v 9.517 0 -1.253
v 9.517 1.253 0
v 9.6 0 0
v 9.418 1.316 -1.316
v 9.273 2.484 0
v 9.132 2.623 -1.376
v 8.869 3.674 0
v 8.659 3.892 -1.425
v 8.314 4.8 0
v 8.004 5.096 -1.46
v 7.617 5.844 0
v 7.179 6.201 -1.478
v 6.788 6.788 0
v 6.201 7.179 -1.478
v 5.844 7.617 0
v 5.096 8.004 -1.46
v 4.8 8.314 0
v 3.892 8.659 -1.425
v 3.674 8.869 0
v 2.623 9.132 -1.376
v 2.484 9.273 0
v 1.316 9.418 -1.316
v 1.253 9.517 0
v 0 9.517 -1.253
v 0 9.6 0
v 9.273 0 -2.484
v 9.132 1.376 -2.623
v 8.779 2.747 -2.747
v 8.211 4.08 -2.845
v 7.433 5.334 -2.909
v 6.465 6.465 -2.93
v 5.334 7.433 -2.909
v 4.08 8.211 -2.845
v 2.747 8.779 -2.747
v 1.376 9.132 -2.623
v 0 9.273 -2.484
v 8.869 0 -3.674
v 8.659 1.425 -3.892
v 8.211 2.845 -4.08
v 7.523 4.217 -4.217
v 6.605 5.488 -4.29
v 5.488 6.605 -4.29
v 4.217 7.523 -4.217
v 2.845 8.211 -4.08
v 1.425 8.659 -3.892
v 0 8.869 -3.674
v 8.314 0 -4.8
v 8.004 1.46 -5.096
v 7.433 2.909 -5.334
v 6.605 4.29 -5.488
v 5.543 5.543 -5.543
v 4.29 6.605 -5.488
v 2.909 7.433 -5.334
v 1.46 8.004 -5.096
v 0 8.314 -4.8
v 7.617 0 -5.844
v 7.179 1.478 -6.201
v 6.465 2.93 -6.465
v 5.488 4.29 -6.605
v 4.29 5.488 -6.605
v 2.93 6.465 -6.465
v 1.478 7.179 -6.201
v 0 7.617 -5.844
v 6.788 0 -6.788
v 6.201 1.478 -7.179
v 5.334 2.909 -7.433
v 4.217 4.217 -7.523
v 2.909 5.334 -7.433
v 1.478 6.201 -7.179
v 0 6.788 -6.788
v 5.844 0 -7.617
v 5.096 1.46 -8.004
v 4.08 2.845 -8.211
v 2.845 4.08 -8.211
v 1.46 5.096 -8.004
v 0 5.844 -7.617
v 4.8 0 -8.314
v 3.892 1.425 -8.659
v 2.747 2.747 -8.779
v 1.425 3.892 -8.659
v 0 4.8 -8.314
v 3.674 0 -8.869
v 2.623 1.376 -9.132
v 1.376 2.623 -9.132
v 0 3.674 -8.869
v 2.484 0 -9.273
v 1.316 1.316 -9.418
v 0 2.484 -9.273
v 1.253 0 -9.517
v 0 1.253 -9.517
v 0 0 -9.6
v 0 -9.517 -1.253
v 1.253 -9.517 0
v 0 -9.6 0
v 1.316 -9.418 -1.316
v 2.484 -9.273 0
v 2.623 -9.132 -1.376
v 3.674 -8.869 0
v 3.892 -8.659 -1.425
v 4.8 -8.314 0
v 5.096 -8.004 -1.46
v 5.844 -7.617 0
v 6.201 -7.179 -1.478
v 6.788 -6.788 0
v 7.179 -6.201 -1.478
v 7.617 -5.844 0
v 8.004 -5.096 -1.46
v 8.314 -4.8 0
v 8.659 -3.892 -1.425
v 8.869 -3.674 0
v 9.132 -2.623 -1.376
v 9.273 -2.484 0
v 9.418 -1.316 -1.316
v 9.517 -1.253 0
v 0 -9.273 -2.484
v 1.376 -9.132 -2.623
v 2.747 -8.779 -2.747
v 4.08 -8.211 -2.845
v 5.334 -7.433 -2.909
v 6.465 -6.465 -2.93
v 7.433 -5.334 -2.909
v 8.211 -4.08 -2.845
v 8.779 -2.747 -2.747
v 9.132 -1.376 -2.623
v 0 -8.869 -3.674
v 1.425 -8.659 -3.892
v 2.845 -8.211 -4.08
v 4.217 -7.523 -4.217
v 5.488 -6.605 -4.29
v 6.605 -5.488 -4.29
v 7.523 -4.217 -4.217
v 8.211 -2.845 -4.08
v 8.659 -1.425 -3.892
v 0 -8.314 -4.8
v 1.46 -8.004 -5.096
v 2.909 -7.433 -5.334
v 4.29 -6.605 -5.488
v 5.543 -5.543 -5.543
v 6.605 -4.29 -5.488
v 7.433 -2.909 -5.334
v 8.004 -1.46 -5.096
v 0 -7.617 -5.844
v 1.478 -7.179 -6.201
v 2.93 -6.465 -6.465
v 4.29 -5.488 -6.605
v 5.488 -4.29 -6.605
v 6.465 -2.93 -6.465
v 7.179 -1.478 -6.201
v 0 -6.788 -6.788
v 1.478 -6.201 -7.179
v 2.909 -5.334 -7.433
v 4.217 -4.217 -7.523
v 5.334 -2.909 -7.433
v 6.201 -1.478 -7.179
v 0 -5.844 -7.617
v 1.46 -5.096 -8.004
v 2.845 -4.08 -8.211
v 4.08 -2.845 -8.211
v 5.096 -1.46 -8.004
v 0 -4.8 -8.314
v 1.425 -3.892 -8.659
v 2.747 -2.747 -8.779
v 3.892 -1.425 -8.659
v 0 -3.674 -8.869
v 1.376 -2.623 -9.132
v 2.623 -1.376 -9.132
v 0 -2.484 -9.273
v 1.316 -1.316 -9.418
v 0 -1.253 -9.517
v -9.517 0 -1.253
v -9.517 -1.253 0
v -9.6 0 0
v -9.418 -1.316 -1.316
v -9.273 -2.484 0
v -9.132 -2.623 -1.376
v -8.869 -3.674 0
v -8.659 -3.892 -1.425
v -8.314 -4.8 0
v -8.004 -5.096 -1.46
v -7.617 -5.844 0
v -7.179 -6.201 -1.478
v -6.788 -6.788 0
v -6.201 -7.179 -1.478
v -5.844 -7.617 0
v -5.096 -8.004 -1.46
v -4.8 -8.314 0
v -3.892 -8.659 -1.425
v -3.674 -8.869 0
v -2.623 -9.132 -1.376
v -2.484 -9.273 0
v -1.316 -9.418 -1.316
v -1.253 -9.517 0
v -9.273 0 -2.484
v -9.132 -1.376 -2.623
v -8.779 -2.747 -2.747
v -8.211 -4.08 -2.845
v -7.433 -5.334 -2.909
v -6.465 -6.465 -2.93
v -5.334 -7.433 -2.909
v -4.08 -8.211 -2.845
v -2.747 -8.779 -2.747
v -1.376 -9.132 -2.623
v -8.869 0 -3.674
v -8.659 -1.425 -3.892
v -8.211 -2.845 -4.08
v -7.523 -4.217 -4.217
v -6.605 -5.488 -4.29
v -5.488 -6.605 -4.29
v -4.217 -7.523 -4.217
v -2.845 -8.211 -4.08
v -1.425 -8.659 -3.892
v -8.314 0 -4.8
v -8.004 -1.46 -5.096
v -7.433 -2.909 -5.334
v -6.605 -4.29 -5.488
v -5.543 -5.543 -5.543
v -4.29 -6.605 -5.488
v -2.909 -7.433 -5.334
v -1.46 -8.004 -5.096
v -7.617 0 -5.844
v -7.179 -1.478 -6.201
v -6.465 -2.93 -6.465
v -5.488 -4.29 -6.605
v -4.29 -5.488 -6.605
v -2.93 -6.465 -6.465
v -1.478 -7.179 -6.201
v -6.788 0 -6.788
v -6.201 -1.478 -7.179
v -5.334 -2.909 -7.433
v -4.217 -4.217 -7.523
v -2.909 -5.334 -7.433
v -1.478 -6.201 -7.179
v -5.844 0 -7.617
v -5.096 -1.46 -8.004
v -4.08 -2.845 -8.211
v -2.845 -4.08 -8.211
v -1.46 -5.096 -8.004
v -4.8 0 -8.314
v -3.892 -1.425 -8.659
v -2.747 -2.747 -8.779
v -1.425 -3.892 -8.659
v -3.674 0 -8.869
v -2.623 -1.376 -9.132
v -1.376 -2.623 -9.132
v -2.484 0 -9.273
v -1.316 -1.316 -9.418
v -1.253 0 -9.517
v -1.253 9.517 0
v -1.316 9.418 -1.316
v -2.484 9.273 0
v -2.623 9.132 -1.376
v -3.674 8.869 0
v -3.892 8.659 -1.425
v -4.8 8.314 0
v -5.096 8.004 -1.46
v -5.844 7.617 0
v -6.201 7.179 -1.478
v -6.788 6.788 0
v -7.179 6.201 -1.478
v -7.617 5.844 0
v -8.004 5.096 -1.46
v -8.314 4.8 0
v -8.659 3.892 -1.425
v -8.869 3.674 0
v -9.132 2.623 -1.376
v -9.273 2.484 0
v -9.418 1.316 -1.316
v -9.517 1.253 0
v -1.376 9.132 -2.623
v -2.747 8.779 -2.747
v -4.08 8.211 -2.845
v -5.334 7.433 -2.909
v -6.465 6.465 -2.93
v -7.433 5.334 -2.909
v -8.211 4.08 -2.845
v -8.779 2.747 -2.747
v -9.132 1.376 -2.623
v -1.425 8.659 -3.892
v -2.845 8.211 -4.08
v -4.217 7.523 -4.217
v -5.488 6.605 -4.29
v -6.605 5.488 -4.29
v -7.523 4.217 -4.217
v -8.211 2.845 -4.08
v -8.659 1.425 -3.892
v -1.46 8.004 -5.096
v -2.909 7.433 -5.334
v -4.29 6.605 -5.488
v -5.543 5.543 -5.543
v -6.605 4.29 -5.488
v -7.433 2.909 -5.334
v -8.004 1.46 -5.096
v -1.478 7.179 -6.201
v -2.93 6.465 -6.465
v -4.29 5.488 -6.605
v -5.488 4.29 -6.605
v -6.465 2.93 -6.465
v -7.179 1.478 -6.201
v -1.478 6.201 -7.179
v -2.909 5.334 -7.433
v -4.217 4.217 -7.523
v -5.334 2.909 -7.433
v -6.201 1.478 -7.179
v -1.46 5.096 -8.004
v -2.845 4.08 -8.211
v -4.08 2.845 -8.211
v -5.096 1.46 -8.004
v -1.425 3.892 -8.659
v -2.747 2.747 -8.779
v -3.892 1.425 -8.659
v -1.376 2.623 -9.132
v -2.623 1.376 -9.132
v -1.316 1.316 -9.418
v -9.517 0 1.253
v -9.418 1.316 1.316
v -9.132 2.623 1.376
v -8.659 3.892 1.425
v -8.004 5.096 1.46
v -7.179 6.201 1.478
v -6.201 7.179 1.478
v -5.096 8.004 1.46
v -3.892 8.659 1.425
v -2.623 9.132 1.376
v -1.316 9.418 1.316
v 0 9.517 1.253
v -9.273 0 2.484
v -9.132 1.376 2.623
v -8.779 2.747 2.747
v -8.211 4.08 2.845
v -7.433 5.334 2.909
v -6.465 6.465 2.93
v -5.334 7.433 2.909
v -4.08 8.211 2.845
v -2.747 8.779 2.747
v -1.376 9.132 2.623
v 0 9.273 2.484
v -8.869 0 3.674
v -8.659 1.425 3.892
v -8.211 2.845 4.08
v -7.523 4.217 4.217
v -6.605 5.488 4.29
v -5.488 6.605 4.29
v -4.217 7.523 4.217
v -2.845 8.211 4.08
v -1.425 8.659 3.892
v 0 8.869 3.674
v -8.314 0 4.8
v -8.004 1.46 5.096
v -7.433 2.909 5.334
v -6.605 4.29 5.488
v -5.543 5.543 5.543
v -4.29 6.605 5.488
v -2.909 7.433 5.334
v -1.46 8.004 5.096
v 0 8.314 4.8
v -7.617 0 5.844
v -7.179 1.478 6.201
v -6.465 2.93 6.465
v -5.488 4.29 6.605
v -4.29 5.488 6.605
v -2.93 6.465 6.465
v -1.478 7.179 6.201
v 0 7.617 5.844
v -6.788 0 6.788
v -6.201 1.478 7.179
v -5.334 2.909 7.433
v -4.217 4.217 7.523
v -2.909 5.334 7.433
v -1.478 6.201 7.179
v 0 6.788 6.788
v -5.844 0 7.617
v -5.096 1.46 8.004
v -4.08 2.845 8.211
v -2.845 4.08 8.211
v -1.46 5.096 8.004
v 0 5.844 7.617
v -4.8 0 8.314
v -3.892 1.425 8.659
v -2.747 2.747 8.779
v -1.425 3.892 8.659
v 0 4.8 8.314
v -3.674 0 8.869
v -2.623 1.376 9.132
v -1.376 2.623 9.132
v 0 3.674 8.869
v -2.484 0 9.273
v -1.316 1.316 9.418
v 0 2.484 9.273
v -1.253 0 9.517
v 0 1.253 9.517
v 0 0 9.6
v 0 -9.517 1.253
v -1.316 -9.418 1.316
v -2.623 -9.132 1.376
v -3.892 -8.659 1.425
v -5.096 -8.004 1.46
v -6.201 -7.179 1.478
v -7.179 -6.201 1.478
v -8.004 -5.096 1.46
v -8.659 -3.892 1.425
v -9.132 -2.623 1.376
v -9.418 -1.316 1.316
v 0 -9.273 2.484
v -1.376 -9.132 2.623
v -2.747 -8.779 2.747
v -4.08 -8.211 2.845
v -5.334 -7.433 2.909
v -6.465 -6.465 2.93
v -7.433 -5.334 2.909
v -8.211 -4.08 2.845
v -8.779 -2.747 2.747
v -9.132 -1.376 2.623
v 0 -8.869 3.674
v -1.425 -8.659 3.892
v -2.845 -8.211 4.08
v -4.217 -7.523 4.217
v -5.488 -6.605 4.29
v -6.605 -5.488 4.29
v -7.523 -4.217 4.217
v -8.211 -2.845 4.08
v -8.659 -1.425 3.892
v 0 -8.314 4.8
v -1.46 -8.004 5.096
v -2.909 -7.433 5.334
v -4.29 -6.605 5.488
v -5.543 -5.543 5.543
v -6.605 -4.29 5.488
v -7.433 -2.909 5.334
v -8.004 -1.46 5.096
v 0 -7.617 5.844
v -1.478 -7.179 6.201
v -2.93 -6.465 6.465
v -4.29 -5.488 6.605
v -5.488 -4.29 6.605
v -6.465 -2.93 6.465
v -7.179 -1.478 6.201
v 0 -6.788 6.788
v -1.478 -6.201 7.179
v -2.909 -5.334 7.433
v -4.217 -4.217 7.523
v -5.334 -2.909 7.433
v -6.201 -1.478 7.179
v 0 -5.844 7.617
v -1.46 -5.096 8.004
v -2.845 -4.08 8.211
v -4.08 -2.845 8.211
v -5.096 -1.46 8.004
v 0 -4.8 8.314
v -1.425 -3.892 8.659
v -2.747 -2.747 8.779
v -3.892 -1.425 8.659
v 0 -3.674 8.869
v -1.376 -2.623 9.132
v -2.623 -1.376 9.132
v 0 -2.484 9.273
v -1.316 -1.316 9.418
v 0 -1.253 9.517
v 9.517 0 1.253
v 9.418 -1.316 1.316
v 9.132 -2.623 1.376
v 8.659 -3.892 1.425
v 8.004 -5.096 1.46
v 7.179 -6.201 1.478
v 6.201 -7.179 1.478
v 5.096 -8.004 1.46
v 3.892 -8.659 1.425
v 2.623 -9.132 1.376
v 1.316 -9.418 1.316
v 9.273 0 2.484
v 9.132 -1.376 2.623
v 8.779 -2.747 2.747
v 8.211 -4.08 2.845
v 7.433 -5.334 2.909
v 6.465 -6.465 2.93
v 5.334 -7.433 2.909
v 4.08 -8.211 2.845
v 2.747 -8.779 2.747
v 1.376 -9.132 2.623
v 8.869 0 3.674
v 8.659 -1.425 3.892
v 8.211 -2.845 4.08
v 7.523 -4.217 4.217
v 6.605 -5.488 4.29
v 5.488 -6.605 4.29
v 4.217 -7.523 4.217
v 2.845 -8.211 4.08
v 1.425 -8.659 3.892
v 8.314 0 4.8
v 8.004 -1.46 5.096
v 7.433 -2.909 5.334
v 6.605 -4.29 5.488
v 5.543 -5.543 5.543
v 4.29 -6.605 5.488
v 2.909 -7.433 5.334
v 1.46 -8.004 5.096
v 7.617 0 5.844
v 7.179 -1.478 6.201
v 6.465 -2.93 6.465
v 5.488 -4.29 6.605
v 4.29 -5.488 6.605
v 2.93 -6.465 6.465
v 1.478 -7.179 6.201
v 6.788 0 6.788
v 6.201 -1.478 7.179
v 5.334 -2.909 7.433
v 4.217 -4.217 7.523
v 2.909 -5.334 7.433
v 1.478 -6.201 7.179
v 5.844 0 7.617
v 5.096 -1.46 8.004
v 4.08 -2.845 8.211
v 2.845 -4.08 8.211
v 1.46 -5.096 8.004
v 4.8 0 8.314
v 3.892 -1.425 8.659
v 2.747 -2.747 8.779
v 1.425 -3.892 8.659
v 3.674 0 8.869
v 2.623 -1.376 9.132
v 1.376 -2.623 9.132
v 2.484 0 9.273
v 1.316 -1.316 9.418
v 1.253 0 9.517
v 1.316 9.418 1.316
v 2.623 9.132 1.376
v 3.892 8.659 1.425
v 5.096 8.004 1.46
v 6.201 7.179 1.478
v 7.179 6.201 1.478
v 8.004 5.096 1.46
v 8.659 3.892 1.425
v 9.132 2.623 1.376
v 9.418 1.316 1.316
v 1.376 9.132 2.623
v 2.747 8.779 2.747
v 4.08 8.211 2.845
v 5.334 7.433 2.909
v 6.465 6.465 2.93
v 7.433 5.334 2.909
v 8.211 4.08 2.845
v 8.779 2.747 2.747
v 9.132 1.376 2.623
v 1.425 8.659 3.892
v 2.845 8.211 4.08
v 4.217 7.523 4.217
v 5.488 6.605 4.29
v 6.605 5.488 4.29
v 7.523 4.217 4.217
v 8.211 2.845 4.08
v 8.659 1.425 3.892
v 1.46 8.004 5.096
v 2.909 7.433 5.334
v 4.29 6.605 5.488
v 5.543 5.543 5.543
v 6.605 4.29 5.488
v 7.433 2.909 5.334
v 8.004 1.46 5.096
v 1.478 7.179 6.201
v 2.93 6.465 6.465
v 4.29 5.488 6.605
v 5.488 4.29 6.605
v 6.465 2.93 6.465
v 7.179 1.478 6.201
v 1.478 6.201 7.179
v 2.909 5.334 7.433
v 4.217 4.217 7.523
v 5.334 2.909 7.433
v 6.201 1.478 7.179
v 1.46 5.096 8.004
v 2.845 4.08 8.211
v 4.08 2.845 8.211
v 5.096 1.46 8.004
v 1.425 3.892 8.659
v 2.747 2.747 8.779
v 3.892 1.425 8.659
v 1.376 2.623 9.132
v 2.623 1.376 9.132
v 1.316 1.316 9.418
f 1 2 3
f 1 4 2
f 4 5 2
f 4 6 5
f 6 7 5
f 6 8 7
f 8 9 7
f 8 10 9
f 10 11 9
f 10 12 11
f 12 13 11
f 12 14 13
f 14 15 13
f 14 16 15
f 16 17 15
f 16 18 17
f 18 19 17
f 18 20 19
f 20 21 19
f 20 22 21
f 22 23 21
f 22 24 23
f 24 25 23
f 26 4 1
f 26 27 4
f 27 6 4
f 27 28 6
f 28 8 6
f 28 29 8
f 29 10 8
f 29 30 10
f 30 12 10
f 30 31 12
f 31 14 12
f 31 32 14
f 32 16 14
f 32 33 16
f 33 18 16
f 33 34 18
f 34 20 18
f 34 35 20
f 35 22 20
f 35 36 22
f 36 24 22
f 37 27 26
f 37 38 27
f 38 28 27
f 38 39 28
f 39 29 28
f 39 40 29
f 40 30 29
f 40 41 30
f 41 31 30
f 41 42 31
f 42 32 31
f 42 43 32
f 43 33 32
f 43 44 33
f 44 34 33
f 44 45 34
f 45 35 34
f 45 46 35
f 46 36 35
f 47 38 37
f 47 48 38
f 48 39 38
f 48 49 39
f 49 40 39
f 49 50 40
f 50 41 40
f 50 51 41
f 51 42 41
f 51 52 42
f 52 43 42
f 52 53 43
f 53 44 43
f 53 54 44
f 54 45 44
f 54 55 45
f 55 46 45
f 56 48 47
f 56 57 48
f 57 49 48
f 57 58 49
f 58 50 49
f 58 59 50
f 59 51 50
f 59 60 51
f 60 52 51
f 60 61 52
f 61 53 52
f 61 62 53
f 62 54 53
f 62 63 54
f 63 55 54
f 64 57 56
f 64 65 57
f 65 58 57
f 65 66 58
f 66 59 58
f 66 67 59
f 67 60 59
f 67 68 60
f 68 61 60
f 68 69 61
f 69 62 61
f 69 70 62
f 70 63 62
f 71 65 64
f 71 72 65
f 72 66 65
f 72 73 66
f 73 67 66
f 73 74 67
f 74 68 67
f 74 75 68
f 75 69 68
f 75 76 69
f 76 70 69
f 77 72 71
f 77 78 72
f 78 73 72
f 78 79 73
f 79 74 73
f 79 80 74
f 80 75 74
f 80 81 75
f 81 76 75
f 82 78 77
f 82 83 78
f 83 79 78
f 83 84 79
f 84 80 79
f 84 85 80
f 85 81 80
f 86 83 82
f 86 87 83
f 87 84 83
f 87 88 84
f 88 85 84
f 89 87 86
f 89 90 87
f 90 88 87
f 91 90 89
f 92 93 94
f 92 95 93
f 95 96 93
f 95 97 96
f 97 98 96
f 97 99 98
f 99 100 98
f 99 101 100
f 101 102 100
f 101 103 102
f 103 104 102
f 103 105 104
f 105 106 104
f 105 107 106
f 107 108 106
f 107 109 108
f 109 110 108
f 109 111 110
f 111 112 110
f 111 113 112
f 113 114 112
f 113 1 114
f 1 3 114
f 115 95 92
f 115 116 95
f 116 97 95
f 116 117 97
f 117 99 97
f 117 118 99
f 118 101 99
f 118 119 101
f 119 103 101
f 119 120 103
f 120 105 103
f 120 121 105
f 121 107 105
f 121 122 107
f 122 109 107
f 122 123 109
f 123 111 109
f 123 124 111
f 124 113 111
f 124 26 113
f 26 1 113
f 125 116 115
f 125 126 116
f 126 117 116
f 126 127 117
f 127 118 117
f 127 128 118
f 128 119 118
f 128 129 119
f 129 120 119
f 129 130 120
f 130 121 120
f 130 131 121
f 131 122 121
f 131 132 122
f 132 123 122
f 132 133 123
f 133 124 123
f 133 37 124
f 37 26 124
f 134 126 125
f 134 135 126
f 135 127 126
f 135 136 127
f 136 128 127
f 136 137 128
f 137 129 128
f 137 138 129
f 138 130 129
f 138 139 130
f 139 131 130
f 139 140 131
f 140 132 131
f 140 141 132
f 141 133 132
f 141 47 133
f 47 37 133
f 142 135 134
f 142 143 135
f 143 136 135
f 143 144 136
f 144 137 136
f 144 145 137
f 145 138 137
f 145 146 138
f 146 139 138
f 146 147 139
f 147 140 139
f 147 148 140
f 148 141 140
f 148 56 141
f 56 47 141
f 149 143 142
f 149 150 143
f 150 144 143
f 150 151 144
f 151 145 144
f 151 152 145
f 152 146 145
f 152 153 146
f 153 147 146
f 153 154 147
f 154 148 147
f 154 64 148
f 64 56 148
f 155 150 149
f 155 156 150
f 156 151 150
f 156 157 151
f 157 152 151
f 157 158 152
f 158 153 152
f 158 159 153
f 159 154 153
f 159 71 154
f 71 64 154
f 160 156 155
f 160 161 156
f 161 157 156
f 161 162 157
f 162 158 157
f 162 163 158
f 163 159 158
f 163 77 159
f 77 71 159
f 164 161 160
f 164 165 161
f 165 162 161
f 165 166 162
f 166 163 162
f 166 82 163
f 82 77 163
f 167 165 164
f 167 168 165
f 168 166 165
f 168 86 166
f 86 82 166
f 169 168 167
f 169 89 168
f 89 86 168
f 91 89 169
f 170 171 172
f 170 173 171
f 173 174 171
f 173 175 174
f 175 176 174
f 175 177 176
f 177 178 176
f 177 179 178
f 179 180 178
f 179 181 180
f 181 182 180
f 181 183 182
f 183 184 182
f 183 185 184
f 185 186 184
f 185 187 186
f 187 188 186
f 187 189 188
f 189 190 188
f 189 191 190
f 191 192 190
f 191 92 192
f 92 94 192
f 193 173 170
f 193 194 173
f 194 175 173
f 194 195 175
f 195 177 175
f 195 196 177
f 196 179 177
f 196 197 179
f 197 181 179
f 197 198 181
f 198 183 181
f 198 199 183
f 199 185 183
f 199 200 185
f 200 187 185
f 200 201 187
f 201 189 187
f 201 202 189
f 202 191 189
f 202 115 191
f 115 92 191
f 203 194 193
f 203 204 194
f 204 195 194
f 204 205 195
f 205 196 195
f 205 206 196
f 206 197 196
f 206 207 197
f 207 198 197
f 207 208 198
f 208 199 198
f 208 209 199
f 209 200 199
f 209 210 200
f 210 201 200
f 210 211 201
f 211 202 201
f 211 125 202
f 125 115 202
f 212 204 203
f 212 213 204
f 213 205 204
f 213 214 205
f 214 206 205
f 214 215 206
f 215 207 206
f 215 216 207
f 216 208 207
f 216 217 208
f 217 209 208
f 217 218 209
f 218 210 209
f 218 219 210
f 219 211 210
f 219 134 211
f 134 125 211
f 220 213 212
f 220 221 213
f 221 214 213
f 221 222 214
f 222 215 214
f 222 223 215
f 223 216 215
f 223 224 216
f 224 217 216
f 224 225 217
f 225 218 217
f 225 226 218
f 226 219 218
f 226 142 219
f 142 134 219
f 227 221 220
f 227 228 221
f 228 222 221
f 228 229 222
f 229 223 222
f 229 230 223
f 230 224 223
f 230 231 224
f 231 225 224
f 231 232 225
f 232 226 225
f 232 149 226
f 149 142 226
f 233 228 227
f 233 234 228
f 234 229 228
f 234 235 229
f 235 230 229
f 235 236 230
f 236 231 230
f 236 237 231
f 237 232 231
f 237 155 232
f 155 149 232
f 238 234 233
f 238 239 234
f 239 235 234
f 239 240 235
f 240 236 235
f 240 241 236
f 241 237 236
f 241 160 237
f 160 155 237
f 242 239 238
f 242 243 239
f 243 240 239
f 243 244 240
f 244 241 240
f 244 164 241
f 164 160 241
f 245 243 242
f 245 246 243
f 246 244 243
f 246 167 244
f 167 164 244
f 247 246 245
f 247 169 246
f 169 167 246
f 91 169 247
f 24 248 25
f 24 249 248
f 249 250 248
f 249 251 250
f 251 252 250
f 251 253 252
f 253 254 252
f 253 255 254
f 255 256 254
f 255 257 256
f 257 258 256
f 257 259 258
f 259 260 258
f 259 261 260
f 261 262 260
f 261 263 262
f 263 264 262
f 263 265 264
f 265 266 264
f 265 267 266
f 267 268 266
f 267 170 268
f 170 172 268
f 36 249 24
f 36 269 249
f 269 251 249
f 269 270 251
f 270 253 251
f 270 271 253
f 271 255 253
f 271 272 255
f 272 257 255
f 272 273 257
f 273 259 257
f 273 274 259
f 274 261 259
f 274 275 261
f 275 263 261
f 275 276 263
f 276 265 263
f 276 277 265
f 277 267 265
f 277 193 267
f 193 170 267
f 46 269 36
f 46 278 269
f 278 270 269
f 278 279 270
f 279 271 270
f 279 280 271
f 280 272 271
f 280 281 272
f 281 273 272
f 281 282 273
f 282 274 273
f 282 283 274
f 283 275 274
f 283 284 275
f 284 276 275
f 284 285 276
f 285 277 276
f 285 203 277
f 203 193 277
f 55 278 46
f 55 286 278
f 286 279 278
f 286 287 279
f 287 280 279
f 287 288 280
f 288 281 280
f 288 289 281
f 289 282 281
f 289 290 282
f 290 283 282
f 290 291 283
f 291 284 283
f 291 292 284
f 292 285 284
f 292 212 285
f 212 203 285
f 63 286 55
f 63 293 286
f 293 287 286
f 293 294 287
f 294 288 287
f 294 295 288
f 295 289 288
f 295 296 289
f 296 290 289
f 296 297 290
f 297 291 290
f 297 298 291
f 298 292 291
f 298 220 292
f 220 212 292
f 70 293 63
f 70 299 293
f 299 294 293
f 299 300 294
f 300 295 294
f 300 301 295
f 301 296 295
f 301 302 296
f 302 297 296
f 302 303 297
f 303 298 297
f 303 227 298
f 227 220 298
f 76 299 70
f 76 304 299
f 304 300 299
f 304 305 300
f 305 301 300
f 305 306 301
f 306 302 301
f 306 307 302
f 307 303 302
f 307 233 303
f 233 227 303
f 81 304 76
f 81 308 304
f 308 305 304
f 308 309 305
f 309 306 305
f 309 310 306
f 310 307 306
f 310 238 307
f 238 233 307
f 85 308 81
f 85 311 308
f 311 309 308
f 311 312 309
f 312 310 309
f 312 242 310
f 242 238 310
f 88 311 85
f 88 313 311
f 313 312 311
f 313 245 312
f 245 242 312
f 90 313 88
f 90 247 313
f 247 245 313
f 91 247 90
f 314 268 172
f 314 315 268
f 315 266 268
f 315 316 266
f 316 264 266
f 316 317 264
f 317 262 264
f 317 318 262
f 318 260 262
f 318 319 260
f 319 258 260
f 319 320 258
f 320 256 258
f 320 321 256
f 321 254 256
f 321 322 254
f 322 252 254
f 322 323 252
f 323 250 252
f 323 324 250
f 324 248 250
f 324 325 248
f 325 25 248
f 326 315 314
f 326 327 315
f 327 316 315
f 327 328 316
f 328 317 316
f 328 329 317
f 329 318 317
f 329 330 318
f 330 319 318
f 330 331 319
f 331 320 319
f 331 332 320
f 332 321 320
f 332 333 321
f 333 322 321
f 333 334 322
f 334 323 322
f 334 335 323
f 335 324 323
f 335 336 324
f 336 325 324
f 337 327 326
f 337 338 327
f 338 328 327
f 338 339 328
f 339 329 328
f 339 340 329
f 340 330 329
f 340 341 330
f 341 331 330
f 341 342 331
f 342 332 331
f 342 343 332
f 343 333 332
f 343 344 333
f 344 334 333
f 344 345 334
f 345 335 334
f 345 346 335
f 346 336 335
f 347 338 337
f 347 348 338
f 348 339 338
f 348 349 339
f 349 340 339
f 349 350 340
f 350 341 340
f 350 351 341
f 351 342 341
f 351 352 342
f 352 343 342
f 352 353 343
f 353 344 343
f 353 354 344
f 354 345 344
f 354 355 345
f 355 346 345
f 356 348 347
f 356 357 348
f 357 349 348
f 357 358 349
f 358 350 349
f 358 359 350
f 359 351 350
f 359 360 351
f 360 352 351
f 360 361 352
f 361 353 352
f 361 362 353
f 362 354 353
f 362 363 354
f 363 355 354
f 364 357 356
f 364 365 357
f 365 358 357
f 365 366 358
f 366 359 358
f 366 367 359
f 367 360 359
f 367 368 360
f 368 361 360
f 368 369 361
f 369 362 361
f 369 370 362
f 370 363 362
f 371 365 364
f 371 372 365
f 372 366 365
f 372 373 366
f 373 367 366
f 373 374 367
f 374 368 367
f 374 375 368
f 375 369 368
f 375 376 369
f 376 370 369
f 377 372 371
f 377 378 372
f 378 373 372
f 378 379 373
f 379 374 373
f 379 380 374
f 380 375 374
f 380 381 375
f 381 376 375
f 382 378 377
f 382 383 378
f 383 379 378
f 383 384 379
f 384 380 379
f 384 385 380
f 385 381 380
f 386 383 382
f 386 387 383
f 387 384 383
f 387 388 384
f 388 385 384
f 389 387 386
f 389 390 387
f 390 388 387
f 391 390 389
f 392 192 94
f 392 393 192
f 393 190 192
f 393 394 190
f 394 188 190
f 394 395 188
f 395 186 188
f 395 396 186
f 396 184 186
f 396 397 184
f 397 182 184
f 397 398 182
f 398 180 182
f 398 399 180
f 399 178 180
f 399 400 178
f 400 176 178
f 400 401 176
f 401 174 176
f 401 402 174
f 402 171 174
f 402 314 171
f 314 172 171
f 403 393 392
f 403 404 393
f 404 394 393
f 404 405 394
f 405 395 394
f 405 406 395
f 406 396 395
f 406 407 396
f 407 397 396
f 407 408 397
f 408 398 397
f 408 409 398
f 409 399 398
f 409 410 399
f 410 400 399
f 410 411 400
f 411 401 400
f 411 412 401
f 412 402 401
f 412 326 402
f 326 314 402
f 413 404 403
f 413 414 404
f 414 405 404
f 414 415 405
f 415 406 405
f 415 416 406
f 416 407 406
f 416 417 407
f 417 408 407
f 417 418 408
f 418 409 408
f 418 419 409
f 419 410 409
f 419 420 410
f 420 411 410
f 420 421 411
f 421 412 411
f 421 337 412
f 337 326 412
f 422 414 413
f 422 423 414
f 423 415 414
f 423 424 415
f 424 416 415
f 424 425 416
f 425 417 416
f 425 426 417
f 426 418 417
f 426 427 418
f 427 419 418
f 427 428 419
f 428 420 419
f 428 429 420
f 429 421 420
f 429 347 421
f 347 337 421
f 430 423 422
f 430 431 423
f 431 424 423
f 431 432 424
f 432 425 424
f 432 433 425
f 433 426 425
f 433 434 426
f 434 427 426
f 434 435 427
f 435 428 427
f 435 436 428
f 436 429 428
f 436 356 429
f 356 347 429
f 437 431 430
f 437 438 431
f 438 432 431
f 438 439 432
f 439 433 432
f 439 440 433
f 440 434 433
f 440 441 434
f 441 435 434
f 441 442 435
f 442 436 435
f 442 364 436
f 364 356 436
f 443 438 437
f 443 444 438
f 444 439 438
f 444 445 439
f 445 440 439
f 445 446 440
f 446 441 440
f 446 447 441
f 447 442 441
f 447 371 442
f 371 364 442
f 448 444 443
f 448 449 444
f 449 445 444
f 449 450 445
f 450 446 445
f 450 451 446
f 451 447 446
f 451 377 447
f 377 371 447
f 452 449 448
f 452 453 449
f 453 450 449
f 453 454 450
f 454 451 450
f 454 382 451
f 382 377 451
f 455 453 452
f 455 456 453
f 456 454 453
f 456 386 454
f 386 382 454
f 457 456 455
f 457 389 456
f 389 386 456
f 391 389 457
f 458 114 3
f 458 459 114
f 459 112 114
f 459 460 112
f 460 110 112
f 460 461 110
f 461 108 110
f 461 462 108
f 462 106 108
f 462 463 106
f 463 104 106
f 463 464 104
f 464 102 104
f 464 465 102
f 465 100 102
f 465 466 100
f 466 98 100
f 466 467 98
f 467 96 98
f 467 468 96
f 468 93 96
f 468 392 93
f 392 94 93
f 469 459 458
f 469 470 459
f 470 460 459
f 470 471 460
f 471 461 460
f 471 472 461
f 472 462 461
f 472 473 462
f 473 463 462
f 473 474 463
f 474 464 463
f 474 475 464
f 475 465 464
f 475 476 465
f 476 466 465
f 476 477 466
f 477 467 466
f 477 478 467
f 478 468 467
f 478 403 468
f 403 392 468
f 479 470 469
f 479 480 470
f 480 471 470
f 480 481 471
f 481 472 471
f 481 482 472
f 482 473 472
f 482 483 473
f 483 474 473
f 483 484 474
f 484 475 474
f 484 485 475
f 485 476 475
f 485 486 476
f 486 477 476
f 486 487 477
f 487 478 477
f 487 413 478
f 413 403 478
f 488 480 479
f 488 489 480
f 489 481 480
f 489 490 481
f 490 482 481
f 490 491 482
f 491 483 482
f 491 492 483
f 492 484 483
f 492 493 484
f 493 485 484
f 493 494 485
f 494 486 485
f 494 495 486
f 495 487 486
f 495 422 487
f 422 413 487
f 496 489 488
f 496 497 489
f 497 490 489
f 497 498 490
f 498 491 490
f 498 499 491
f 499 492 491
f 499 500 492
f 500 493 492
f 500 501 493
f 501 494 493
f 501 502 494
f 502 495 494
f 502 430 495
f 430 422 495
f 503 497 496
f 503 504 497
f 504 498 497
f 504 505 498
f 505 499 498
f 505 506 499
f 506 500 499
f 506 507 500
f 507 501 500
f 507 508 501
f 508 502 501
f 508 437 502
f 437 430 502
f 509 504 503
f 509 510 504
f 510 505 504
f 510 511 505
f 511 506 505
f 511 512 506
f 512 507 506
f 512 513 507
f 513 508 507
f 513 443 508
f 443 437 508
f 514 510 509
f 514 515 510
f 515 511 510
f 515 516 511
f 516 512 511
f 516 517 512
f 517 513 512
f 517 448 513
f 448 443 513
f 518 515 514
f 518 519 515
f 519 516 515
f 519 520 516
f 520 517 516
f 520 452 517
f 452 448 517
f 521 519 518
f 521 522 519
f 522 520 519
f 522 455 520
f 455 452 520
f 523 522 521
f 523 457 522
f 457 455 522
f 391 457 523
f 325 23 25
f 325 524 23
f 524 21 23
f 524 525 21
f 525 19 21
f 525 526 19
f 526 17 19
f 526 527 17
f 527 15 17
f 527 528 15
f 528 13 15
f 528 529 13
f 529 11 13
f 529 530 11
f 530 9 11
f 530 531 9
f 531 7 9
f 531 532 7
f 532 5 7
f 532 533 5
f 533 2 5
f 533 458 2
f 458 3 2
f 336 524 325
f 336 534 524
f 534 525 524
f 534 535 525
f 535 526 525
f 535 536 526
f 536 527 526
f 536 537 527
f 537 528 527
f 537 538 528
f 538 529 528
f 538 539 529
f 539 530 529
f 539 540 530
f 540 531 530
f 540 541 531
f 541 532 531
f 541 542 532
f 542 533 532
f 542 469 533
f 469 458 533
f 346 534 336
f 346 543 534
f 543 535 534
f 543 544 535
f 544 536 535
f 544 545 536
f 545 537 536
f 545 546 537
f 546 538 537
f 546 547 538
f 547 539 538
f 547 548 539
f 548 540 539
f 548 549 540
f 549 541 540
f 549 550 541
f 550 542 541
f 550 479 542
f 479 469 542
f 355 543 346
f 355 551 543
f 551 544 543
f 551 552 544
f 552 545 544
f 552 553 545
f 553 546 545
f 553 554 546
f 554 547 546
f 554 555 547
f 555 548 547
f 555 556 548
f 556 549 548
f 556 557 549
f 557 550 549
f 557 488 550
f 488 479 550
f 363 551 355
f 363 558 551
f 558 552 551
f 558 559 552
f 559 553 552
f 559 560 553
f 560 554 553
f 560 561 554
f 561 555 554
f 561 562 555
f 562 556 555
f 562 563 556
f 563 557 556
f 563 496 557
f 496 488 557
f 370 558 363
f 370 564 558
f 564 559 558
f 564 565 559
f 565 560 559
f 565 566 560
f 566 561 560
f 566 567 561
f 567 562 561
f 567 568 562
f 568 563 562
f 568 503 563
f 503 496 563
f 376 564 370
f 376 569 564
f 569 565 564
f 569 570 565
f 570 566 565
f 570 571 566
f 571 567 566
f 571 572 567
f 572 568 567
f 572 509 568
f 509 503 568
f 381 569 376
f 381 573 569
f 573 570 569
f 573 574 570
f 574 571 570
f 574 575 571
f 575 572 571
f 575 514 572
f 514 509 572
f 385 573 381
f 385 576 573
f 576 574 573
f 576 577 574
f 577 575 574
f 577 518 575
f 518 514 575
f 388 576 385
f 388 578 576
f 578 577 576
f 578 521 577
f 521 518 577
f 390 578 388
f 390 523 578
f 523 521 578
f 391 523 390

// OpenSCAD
use <../lib.scad>
use <../p/48/8-8sphe.scad>
$fa=1; $fs=0.2;
function ldraw_lib__52629(realsolid=false) = [
// 0 Technic Ball 19mm for Ball Castor
// 0 Name: 52629.dat
// 0 Author: Philippe Hurbain [Philo]
// 0 !LDRAW_ORG Part UPDATE 2019-01
// 0 !LICENSE Licensed under CC BY 2.0 and CC BY 4.0 : see CAreadme.txt
// 
// 0 BFC CERTIFY CCW
  [0,"BFC","CERTIFY"],
  [0,"BFC","CCW"],
// 
// 0 !KEYWORDS Spike Prime
// 
// 0 !HISTORY 2019-06-28 [PTadmin] Official Update 2019-01
// 
// 
// 1 16 0 0 0 24 0 0 0 24 0 0 0 24 48\8-8sphe.dat
  [1,16,0,0,0,24,0,0,0,24,0,0,0,24, ldraw_lib__48__8_8sphe(realsolid)],
];
module ldraw_lib__52629(step=0, col=false, unit=2/5, alt=false, line=0.2, solid=!$preview)
    makepoly(ldraw_lib__52629(solid), step=step, col=col, unit=unit, alt=alt, line=line, solid=solid);
ldraw_lib__52629(line=0.2);
